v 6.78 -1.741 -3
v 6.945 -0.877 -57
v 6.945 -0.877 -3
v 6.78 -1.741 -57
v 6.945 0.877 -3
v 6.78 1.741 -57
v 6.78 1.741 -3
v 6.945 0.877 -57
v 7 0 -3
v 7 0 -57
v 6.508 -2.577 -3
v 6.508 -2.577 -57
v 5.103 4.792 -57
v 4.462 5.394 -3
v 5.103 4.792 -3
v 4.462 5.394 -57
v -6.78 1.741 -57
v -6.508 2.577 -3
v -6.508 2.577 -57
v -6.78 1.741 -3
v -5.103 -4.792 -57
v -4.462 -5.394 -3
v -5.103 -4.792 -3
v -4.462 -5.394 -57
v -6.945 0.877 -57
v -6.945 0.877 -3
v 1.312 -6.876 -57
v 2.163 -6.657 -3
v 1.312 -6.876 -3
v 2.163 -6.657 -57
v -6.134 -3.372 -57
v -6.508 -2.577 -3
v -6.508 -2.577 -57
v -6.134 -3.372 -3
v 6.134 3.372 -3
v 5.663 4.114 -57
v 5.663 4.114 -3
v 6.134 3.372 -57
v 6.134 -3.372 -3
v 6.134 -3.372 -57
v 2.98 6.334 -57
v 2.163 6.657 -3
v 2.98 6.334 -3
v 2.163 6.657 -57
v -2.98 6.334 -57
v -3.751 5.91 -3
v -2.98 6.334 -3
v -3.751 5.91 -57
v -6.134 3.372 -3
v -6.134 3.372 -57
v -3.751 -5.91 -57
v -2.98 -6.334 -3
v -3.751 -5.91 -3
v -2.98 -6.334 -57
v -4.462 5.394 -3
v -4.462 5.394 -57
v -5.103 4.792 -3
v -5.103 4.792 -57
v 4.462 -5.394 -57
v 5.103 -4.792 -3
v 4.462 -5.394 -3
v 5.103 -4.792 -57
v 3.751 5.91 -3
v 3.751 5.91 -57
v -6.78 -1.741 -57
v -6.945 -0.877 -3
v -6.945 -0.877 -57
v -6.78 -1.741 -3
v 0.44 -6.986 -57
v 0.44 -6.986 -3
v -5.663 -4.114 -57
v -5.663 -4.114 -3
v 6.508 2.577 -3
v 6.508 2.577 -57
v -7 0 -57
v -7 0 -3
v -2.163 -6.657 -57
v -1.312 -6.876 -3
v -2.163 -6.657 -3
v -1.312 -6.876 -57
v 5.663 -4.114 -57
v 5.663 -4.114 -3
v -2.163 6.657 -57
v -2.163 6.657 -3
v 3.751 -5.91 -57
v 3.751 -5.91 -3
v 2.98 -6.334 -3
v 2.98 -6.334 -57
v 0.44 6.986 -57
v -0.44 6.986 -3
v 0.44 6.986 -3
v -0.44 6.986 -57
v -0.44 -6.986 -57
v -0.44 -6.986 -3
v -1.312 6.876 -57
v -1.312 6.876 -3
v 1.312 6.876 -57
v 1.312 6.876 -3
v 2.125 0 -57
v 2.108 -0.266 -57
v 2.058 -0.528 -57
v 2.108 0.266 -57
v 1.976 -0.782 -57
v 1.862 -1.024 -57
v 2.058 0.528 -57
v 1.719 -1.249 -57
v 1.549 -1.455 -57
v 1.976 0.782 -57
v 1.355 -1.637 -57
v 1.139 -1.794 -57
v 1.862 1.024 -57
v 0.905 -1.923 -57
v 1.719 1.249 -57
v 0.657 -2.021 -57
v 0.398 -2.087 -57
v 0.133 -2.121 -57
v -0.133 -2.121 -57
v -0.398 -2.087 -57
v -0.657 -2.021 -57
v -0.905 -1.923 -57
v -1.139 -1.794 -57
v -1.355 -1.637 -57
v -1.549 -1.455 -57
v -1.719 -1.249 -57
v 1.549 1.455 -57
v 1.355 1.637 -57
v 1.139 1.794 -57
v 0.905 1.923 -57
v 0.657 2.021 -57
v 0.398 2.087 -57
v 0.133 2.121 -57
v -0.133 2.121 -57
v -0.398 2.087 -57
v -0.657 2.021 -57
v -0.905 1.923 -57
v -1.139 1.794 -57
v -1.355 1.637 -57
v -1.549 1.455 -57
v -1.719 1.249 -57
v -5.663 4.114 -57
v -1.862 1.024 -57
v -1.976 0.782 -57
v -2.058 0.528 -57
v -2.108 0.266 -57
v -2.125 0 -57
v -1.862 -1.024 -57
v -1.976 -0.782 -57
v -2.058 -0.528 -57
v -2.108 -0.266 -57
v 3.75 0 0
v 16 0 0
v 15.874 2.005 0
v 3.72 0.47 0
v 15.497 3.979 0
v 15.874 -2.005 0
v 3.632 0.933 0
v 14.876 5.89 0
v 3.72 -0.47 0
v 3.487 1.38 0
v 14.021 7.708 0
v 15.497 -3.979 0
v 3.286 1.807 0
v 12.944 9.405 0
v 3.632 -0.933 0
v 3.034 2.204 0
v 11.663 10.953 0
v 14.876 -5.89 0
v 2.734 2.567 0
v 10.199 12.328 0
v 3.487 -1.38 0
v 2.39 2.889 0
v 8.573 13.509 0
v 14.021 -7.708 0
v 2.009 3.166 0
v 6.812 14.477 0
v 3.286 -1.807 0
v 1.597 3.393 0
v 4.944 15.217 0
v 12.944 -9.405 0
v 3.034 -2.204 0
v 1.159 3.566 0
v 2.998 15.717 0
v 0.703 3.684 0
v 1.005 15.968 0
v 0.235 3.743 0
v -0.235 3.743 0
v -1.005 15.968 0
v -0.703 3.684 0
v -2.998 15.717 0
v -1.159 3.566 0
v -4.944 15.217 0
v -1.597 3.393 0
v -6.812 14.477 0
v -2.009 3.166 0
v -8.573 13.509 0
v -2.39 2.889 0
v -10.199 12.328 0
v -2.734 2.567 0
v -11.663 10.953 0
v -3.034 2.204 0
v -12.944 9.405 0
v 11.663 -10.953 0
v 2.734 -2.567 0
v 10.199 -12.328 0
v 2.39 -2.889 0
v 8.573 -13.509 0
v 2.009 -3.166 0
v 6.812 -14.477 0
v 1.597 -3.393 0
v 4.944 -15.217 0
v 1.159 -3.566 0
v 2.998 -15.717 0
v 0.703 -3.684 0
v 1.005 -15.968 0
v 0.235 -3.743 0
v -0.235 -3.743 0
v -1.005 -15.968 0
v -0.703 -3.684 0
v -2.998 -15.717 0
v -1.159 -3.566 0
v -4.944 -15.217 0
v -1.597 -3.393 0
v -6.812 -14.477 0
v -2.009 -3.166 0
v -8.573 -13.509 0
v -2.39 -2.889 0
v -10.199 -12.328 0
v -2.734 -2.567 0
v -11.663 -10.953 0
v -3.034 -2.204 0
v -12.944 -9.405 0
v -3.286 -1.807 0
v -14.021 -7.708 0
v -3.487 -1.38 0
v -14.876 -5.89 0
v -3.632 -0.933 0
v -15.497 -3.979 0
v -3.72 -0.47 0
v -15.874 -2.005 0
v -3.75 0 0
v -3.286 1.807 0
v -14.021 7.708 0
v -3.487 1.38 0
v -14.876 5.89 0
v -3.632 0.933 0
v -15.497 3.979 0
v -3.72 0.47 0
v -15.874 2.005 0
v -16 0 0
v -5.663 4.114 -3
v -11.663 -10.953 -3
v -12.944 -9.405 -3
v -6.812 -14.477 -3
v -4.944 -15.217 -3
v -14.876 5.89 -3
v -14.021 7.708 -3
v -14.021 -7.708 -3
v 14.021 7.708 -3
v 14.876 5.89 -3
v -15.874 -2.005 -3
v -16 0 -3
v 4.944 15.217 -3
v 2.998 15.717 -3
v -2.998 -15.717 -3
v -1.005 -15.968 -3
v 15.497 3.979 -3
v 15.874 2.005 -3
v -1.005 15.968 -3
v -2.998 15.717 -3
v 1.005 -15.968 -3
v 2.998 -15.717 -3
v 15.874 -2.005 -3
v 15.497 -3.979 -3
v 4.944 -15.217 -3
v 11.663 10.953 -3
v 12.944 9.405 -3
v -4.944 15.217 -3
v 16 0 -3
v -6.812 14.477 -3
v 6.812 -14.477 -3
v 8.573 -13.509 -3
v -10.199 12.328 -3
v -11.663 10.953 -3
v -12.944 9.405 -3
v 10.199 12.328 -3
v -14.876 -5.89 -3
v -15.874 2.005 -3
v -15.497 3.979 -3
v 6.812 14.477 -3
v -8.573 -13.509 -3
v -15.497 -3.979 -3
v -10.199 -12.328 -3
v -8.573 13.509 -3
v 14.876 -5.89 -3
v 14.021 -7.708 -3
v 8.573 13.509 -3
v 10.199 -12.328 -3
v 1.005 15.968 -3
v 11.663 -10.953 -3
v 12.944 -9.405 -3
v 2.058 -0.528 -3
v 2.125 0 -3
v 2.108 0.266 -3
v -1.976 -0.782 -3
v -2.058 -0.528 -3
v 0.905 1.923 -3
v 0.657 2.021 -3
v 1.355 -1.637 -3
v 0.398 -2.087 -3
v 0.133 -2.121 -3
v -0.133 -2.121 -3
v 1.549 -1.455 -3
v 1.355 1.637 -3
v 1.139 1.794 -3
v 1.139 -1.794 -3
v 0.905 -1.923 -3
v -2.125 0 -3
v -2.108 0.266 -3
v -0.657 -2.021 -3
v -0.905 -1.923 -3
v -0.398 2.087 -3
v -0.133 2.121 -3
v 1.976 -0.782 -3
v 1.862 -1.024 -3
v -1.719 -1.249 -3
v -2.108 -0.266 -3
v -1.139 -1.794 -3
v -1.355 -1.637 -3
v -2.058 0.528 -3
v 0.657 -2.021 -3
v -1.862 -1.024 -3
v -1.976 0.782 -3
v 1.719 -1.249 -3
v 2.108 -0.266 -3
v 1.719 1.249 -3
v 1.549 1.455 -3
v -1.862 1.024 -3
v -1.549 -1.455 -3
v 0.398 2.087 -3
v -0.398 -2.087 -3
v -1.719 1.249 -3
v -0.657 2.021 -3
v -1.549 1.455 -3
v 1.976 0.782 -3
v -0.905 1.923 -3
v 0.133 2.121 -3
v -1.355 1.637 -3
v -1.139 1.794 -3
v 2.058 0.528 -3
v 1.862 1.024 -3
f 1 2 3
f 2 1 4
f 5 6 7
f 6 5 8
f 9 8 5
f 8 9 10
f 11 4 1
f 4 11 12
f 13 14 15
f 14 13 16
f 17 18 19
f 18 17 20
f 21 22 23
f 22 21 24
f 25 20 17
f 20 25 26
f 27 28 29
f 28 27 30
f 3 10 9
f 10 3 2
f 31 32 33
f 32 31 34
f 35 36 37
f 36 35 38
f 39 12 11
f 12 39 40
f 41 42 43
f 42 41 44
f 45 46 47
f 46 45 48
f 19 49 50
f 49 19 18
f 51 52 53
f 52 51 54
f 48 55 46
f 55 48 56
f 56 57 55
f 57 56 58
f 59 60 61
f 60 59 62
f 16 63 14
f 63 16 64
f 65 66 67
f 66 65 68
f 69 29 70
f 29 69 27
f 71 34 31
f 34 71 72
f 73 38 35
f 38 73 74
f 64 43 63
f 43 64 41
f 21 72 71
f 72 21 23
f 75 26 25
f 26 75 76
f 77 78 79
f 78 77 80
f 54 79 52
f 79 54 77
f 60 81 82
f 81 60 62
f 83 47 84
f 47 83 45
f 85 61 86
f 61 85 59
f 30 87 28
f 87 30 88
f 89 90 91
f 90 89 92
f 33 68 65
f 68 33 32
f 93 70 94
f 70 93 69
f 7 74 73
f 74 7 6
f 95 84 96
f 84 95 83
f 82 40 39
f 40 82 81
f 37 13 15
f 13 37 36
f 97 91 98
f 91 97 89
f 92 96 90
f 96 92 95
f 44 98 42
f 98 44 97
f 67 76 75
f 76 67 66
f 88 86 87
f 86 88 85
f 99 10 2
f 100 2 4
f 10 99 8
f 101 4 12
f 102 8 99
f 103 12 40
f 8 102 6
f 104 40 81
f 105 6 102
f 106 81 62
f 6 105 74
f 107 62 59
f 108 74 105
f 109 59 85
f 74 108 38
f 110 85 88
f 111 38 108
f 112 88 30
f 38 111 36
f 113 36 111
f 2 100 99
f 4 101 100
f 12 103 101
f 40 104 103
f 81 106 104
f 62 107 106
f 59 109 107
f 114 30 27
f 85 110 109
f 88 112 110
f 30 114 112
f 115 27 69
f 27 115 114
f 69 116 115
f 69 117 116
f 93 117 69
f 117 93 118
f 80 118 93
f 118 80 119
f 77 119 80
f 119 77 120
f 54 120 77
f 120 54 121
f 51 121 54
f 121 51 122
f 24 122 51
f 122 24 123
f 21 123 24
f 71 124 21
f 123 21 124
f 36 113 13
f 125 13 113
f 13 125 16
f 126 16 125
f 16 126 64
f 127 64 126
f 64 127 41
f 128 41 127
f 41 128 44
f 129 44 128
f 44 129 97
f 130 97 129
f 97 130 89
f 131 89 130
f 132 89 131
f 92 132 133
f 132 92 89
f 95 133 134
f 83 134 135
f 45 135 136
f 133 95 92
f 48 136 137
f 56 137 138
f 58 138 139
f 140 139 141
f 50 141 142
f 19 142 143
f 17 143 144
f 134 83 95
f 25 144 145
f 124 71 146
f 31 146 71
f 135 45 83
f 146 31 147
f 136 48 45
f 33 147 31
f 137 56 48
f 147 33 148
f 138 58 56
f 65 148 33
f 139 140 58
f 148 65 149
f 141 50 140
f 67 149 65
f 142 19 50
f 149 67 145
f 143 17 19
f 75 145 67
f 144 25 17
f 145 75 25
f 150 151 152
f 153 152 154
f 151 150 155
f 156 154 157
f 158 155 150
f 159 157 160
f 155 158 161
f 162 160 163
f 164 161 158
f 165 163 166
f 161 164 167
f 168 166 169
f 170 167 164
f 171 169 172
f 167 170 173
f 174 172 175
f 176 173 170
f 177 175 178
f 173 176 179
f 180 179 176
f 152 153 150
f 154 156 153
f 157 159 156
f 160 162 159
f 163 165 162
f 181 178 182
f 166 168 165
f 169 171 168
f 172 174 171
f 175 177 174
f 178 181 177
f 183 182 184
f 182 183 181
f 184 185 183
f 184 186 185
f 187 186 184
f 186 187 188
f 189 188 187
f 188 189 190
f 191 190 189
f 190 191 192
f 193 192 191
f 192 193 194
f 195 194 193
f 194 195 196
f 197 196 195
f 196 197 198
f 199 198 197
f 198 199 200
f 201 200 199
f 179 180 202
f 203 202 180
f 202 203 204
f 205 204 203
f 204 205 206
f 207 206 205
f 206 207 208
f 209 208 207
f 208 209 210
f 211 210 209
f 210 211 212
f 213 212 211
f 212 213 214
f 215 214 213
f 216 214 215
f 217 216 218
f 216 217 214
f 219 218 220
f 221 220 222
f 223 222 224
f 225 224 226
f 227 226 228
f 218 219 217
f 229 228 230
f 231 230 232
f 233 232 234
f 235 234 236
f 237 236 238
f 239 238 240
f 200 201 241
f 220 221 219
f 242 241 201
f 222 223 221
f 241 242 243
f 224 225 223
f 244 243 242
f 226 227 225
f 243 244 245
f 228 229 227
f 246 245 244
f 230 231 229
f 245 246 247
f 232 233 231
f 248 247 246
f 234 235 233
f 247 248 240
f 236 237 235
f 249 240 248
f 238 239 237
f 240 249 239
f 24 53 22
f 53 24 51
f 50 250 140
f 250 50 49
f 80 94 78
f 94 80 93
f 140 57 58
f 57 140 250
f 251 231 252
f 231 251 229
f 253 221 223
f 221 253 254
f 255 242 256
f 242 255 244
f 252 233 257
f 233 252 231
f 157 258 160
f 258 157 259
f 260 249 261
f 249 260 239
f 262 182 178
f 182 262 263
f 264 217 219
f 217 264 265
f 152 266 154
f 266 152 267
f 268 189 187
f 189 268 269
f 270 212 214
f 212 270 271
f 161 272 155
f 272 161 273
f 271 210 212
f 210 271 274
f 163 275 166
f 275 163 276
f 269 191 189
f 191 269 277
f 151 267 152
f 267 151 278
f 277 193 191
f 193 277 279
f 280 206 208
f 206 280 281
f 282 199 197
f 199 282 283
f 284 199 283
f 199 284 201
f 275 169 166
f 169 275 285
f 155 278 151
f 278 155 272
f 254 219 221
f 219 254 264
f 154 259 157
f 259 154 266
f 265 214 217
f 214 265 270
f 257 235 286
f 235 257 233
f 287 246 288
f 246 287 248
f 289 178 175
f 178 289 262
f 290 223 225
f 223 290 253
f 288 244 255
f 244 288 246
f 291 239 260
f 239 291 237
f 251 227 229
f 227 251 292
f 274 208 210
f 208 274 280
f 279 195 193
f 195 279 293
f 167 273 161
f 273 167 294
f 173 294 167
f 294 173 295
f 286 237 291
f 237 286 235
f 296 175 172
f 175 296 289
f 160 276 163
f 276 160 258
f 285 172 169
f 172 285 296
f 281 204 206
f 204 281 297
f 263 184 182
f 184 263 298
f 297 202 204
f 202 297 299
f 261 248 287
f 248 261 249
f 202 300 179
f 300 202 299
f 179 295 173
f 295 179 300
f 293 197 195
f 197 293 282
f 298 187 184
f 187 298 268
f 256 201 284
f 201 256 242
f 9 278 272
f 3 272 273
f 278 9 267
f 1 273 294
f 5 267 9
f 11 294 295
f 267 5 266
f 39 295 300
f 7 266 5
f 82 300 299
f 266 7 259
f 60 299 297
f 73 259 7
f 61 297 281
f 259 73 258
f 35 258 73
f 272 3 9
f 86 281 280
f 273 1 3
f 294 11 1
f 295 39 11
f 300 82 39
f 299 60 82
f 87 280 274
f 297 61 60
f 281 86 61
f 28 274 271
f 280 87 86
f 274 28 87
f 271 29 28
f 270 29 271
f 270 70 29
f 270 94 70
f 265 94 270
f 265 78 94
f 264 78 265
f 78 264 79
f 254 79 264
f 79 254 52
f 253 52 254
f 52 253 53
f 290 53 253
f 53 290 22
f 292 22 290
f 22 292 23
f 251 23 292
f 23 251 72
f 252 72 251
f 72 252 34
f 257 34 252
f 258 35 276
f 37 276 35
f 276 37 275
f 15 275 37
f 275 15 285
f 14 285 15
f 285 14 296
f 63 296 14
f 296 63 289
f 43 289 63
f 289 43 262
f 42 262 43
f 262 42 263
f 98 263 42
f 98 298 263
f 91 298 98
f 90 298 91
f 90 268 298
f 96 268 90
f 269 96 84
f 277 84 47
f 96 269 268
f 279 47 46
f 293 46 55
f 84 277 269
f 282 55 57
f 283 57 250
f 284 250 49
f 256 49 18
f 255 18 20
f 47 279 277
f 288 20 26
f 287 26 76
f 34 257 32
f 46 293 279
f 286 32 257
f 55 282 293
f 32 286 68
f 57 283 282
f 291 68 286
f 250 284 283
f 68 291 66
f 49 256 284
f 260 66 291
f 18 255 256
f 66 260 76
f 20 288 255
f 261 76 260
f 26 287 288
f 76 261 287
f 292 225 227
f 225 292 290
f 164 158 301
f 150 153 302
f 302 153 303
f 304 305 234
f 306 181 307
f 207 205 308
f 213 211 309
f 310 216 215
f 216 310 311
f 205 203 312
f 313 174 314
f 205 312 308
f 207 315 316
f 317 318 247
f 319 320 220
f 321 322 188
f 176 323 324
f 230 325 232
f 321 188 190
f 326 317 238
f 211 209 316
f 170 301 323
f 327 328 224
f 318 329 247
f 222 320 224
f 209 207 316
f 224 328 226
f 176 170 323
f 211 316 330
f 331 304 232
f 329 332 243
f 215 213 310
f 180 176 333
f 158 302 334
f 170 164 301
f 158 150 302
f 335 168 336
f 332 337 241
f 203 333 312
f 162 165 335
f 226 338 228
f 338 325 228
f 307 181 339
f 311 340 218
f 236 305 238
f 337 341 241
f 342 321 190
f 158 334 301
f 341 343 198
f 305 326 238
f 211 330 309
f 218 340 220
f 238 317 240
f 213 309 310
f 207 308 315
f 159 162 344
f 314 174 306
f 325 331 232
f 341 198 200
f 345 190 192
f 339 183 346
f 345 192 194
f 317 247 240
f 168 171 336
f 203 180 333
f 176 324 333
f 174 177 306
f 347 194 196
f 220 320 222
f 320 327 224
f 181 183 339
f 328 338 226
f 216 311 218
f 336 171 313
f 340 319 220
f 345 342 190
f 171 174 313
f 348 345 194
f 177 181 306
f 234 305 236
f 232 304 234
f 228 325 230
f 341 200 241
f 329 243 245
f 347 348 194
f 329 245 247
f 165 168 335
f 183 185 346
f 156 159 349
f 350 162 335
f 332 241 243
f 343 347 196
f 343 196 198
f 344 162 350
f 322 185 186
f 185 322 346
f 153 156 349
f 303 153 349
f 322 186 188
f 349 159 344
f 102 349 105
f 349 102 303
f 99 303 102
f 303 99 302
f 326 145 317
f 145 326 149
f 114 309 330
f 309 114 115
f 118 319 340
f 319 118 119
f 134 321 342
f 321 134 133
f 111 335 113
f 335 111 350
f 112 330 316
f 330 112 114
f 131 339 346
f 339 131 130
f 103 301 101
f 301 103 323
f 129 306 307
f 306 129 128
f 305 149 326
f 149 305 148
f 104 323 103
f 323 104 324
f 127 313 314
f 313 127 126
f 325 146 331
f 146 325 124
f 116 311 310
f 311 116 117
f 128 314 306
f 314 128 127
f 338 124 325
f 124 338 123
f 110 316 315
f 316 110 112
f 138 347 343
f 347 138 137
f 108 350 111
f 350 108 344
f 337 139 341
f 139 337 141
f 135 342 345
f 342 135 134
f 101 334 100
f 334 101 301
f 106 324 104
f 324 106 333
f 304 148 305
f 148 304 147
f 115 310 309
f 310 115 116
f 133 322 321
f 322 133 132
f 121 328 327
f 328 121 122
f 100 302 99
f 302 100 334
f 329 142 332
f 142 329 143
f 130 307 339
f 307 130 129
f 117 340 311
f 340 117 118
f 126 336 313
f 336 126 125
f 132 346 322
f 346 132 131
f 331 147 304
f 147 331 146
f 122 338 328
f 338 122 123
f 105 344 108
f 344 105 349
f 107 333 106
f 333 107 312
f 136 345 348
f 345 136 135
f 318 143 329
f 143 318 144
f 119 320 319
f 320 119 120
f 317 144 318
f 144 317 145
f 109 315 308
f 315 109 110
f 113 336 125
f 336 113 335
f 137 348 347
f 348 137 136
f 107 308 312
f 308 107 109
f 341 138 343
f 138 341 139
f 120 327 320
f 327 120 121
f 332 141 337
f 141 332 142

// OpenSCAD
$fn = 50;


difference() {
	union() {
		translate(v = [0, 0, -57.0000000000]) {
			cylinder(h = 57, r = 7.0000000000);
		}
		translate(v = [0, 0, -3.0000000000]) {
			cylinder(h = 3, r = 16.0000000000);
		}
	}
	union() {
		translate(v = [0, 0, 0]) {
			rotate(a = [0, 0, 0]) {
				difference() {
					union() {
						#translate(v = [0, 0, -57.0000000000]) {
							cylinder(h = 57, r = 2.0000000000);
						}
						#translate(v = [0, 0, -3]) {
							cylinder(h = 3, r = 7.0000000000, r1 = 2.1250000000, r2 = 3.7500000000);
						}
						#translate(v = [0, 0, -57.0000000000]) {
							cylinder(h = 57, r = 2.1250000000);
						}
						#translate(v = [0, 0, -57.0000000000]) {
							cylinder(h = 57, r = 2.0000000000);
						}
					}
					union();
				}
			}
		}
	}
}
